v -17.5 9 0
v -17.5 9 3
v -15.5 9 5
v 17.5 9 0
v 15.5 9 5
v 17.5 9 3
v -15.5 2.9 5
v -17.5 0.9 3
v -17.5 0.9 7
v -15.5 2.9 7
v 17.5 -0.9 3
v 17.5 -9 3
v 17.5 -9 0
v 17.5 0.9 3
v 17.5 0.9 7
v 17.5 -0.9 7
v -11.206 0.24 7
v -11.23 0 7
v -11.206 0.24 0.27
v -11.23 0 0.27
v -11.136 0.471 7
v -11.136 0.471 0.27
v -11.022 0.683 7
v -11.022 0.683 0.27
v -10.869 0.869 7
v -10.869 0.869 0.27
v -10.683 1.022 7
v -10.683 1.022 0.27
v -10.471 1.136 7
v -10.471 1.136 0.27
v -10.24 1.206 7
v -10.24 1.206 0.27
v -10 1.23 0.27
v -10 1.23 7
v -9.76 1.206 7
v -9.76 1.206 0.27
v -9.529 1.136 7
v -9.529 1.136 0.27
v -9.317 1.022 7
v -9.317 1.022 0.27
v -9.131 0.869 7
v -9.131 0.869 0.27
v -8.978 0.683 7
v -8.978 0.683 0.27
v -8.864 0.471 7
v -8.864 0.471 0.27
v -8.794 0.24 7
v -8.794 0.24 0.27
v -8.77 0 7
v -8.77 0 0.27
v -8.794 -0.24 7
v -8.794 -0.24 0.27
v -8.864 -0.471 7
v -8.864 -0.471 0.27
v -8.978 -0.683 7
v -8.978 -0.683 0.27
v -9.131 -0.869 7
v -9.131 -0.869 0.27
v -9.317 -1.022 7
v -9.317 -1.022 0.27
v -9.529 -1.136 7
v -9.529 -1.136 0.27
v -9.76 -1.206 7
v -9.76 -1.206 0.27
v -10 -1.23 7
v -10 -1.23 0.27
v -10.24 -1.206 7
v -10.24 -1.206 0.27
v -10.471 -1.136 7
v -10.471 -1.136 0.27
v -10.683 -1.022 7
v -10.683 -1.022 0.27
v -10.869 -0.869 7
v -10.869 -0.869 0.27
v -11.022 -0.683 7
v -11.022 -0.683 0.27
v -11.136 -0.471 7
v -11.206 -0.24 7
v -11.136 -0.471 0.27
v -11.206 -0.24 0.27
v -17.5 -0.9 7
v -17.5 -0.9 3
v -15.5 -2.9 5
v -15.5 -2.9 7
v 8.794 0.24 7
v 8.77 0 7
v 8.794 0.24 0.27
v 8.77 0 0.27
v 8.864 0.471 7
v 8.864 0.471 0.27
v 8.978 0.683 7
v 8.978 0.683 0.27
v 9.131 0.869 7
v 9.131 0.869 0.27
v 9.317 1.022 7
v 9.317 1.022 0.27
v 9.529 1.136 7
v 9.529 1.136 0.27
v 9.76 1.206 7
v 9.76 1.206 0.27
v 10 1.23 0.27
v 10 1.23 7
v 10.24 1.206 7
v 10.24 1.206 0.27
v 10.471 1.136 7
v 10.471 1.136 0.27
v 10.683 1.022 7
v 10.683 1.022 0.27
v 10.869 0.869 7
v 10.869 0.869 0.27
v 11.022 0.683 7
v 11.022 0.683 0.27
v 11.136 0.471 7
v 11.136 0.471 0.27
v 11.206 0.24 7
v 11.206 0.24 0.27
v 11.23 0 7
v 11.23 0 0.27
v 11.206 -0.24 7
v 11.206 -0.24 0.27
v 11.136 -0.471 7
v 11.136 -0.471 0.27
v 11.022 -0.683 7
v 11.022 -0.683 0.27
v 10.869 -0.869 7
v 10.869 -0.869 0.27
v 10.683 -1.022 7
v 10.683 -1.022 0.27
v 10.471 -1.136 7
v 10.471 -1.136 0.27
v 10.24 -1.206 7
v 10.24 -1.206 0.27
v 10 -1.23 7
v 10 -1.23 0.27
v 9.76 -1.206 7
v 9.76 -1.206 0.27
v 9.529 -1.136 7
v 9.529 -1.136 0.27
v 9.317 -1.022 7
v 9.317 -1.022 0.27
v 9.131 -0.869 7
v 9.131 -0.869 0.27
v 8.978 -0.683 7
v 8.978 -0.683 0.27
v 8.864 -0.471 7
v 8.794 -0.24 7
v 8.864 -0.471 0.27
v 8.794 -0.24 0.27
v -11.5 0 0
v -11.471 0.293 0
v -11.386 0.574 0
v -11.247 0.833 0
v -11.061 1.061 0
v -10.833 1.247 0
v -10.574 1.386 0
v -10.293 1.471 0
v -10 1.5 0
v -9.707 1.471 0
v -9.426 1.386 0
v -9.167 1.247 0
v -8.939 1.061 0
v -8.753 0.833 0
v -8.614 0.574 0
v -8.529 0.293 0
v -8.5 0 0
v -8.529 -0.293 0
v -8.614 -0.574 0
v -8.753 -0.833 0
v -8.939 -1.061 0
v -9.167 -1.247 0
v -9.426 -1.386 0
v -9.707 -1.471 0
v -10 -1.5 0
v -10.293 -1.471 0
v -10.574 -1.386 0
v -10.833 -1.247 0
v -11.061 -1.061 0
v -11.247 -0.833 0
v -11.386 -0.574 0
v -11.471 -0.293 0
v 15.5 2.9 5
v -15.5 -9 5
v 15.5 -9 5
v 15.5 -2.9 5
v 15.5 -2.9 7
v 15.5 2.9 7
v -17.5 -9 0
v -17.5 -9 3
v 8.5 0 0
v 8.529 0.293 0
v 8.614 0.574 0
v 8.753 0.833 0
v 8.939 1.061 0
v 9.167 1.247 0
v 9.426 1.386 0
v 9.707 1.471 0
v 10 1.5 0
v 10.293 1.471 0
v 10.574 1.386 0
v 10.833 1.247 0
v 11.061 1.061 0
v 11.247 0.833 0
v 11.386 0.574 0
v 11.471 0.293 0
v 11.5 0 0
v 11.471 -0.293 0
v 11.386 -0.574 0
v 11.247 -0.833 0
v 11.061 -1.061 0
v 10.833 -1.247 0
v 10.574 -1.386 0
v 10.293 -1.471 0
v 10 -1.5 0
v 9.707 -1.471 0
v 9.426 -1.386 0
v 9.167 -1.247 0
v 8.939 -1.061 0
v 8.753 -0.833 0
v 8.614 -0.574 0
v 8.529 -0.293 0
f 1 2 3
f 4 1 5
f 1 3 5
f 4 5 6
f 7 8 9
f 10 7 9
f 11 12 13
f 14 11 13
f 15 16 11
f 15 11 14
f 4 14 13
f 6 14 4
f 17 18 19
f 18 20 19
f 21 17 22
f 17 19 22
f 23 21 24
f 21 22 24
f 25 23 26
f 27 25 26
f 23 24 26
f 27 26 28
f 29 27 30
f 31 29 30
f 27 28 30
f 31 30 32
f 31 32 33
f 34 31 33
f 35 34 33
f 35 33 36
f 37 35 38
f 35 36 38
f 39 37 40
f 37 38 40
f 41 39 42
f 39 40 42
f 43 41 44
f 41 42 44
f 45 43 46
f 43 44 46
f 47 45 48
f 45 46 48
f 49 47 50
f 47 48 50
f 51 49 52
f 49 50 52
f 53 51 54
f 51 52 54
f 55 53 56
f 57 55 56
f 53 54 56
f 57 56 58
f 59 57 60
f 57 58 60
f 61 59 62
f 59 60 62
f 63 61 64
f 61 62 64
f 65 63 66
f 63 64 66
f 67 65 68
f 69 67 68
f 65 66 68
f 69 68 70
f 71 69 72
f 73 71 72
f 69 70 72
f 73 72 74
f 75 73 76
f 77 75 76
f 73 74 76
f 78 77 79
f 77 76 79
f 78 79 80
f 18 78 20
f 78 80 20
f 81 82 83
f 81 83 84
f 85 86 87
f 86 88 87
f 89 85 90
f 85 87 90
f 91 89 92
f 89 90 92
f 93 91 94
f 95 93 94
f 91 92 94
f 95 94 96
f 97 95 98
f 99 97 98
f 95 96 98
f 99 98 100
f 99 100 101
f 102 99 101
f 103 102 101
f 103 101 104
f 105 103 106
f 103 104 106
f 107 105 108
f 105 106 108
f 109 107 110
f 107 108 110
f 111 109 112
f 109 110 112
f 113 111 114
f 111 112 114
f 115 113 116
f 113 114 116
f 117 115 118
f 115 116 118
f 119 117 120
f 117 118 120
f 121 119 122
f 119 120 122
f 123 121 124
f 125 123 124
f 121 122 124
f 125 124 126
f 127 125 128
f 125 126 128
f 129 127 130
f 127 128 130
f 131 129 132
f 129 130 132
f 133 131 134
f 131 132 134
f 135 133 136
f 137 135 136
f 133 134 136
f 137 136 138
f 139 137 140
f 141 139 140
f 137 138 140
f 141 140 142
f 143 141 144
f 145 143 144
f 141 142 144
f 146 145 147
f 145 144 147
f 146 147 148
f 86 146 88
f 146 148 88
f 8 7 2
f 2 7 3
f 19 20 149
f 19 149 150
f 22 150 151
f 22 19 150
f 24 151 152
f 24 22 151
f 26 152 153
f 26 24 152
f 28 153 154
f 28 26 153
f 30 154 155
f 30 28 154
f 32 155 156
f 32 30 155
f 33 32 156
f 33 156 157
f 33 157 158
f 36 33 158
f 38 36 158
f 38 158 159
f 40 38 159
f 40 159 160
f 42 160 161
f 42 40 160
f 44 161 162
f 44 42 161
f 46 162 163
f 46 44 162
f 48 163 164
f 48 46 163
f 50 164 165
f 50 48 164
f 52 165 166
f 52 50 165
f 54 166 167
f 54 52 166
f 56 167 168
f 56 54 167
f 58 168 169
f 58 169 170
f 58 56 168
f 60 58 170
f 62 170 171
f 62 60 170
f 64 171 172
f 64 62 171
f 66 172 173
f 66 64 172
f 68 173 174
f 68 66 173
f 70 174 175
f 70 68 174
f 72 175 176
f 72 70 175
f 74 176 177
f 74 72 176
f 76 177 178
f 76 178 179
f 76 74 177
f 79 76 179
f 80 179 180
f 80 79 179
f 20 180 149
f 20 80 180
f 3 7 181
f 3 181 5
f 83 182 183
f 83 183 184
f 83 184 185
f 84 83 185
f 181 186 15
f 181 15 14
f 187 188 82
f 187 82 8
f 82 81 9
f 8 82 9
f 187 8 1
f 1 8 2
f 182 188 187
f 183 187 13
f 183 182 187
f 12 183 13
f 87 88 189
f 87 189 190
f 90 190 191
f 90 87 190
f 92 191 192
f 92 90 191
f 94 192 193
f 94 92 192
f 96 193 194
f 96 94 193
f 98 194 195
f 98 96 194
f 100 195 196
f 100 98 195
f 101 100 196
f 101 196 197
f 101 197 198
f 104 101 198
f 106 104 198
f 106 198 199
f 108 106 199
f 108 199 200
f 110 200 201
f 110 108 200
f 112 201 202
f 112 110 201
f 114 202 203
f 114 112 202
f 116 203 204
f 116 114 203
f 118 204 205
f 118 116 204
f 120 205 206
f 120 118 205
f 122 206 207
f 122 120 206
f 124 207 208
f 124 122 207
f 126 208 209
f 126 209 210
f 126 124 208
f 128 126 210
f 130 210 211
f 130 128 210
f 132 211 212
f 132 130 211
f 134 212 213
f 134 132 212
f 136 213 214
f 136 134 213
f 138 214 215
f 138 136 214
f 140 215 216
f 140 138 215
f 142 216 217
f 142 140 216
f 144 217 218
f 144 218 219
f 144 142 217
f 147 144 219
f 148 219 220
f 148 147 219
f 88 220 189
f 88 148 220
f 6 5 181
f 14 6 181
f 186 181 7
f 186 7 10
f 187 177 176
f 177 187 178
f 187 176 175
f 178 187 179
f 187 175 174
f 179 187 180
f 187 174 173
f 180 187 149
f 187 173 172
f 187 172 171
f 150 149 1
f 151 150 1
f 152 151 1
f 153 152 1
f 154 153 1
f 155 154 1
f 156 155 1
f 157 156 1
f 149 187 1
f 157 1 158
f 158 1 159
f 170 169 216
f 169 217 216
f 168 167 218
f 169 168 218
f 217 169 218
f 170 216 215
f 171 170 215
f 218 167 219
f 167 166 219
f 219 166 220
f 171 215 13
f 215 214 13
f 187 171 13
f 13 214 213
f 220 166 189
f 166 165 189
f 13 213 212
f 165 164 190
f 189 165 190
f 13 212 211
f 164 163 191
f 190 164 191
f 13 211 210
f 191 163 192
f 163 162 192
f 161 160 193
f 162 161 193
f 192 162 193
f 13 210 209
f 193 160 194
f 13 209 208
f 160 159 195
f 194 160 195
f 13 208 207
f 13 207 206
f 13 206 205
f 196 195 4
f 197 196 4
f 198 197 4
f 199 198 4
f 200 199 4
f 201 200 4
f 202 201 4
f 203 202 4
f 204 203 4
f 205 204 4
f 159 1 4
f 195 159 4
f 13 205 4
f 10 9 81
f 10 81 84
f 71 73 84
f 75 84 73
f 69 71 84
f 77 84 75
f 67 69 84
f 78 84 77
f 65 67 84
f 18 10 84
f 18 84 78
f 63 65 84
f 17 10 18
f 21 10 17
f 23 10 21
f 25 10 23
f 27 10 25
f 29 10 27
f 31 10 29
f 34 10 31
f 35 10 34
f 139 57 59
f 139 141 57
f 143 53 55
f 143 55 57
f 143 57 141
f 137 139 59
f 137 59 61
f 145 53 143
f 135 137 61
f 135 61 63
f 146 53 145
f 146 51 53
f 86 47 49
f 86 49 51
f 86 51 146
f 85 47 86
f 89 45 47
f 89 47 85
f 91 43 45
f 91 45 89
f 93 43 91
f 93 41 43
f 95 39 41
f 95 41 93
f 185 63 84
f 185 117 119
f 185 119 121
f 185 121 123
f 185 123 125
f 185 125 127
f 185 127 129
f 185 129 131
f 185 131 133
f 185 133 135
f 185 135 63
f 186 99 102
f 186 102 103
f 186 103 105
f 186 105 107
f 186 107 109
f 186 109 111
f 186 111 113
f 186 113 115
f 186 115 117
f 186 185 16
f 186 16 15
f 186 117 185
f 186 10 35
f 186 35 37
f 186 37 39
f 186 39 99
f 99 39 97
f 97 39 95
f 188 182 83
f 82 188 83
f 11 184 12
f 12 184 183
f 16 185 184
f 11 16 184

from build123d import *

# Parameters (mm, degrees)
SKETCH1_W                = 35
SKETCH1_H                = 18
BOSS_EXTRUDE1_DEPTH      = 8
SKETCH2_W                = 3
SKETCH2_H                = 6.1
CUT_EXTRUDE1_DEPTH       = 36
SKETCH3_W                = 3
SKETCH3_H                = 6.1
CUT_EXTRUDE2_DEPTH       = 36
M2_CLEARANCE_HOLE1_D     = 2.459
M2_CLEARANCE_HOLE1_DEPTH = 8
CHAMFER1_SIZE            = 0.2705
CHAMFER2_SIZE            = 2
SKETCH6_W                = 35
SKETCH6_H                = 1
CUT_EXTRUDE4_DEPTH       = 10


with BuildPart() as part:
    # Sketch1 → Boss-Extrude1 (new body)
    with BuildSketch(Plane.XY.offset(8)):
        Rectangle(SKETCH1_W, SKETCH1_H)
    extrude(amount=-BOSS_EXTRUDE1_DEPTH)

    # Sketch2 → Cut-Extrude1 (cut, through all)
    with BuildSketch(Plane.ZY.offset(17.5)):
        with Locations((6.5, 5.95)):
            Rectangle(SKETCH2_W, SKETCH2_H)
    extrude(amount=-CUT_EXTRUDE1_DEPTH, mode=Mode.SUBTRACT)

    # Sketch3 → Cut-Extrude2 (cut, through all)
    with BuildSketch(Plane.ZY.offset(17.5)):
        with Locations((6.5, -5.95)):
            Rectangle(SKETCH3_W, SKETCH3_H)
    extrude(amount=-CUT_EXTRUDE2_DEPTH, mode=Mode.SUBTRACT)

    # M2 Clearance Hole1
    with Locations(Plane.XY.offset(8)):
        with Locations((-10, 0), (10, 0)):
            Hole(M2_CLEARANCE_HOLE1_D / 2, depth=M2_CLEARANCE_HOLE1_DEPTH)

    # Chamfer1
    chamfer1_edges = [part.edges().sort_by_distance(p)[0] for p in [
        (11.2295, 0, 8),
        (11.2295, 0, 0),
        (-8.7705, 0, 8),
        (-8.7705, 0, 0),
    ]]
    chamfer(chamfer1_edges, length=CHAMFER1_SIZE)

    # Chamfer2
    chamfer2_edges = [part.edges().sort_by_distance(p)[0] for p in [
        (17.5, 5.95, 5),
        (17.5, 2.9, 6.5),
        (-17.5, 5.95, 5),
        (-17.5, 2.9, 6.5),
        (17.5, -5.95, 5),
        (17.5, -2.9, 6.5),
        (-17.5, -2.9, 6.5),
        (-17.5, -5.95, 5),
    ]]
    chamfer(chamfer2_edges, length=CHAMFER2_SIZE)

    # Sketch6 → Cut-Extrude4 (cut)
    with BuildSketch(Plane(origin=(0, 2.9, 0), x_dir=(1, 0, 0), z_dir=(0, 1, 0))):
        with Locations((0, -7.5)):
            Rectangle(SKETCH6_W, SKETCH6_H)
    extrude(amount=-CUT_EXTRUDE4_DEPTH, mode=Mode.SUBTRACT)


solid = part.part
